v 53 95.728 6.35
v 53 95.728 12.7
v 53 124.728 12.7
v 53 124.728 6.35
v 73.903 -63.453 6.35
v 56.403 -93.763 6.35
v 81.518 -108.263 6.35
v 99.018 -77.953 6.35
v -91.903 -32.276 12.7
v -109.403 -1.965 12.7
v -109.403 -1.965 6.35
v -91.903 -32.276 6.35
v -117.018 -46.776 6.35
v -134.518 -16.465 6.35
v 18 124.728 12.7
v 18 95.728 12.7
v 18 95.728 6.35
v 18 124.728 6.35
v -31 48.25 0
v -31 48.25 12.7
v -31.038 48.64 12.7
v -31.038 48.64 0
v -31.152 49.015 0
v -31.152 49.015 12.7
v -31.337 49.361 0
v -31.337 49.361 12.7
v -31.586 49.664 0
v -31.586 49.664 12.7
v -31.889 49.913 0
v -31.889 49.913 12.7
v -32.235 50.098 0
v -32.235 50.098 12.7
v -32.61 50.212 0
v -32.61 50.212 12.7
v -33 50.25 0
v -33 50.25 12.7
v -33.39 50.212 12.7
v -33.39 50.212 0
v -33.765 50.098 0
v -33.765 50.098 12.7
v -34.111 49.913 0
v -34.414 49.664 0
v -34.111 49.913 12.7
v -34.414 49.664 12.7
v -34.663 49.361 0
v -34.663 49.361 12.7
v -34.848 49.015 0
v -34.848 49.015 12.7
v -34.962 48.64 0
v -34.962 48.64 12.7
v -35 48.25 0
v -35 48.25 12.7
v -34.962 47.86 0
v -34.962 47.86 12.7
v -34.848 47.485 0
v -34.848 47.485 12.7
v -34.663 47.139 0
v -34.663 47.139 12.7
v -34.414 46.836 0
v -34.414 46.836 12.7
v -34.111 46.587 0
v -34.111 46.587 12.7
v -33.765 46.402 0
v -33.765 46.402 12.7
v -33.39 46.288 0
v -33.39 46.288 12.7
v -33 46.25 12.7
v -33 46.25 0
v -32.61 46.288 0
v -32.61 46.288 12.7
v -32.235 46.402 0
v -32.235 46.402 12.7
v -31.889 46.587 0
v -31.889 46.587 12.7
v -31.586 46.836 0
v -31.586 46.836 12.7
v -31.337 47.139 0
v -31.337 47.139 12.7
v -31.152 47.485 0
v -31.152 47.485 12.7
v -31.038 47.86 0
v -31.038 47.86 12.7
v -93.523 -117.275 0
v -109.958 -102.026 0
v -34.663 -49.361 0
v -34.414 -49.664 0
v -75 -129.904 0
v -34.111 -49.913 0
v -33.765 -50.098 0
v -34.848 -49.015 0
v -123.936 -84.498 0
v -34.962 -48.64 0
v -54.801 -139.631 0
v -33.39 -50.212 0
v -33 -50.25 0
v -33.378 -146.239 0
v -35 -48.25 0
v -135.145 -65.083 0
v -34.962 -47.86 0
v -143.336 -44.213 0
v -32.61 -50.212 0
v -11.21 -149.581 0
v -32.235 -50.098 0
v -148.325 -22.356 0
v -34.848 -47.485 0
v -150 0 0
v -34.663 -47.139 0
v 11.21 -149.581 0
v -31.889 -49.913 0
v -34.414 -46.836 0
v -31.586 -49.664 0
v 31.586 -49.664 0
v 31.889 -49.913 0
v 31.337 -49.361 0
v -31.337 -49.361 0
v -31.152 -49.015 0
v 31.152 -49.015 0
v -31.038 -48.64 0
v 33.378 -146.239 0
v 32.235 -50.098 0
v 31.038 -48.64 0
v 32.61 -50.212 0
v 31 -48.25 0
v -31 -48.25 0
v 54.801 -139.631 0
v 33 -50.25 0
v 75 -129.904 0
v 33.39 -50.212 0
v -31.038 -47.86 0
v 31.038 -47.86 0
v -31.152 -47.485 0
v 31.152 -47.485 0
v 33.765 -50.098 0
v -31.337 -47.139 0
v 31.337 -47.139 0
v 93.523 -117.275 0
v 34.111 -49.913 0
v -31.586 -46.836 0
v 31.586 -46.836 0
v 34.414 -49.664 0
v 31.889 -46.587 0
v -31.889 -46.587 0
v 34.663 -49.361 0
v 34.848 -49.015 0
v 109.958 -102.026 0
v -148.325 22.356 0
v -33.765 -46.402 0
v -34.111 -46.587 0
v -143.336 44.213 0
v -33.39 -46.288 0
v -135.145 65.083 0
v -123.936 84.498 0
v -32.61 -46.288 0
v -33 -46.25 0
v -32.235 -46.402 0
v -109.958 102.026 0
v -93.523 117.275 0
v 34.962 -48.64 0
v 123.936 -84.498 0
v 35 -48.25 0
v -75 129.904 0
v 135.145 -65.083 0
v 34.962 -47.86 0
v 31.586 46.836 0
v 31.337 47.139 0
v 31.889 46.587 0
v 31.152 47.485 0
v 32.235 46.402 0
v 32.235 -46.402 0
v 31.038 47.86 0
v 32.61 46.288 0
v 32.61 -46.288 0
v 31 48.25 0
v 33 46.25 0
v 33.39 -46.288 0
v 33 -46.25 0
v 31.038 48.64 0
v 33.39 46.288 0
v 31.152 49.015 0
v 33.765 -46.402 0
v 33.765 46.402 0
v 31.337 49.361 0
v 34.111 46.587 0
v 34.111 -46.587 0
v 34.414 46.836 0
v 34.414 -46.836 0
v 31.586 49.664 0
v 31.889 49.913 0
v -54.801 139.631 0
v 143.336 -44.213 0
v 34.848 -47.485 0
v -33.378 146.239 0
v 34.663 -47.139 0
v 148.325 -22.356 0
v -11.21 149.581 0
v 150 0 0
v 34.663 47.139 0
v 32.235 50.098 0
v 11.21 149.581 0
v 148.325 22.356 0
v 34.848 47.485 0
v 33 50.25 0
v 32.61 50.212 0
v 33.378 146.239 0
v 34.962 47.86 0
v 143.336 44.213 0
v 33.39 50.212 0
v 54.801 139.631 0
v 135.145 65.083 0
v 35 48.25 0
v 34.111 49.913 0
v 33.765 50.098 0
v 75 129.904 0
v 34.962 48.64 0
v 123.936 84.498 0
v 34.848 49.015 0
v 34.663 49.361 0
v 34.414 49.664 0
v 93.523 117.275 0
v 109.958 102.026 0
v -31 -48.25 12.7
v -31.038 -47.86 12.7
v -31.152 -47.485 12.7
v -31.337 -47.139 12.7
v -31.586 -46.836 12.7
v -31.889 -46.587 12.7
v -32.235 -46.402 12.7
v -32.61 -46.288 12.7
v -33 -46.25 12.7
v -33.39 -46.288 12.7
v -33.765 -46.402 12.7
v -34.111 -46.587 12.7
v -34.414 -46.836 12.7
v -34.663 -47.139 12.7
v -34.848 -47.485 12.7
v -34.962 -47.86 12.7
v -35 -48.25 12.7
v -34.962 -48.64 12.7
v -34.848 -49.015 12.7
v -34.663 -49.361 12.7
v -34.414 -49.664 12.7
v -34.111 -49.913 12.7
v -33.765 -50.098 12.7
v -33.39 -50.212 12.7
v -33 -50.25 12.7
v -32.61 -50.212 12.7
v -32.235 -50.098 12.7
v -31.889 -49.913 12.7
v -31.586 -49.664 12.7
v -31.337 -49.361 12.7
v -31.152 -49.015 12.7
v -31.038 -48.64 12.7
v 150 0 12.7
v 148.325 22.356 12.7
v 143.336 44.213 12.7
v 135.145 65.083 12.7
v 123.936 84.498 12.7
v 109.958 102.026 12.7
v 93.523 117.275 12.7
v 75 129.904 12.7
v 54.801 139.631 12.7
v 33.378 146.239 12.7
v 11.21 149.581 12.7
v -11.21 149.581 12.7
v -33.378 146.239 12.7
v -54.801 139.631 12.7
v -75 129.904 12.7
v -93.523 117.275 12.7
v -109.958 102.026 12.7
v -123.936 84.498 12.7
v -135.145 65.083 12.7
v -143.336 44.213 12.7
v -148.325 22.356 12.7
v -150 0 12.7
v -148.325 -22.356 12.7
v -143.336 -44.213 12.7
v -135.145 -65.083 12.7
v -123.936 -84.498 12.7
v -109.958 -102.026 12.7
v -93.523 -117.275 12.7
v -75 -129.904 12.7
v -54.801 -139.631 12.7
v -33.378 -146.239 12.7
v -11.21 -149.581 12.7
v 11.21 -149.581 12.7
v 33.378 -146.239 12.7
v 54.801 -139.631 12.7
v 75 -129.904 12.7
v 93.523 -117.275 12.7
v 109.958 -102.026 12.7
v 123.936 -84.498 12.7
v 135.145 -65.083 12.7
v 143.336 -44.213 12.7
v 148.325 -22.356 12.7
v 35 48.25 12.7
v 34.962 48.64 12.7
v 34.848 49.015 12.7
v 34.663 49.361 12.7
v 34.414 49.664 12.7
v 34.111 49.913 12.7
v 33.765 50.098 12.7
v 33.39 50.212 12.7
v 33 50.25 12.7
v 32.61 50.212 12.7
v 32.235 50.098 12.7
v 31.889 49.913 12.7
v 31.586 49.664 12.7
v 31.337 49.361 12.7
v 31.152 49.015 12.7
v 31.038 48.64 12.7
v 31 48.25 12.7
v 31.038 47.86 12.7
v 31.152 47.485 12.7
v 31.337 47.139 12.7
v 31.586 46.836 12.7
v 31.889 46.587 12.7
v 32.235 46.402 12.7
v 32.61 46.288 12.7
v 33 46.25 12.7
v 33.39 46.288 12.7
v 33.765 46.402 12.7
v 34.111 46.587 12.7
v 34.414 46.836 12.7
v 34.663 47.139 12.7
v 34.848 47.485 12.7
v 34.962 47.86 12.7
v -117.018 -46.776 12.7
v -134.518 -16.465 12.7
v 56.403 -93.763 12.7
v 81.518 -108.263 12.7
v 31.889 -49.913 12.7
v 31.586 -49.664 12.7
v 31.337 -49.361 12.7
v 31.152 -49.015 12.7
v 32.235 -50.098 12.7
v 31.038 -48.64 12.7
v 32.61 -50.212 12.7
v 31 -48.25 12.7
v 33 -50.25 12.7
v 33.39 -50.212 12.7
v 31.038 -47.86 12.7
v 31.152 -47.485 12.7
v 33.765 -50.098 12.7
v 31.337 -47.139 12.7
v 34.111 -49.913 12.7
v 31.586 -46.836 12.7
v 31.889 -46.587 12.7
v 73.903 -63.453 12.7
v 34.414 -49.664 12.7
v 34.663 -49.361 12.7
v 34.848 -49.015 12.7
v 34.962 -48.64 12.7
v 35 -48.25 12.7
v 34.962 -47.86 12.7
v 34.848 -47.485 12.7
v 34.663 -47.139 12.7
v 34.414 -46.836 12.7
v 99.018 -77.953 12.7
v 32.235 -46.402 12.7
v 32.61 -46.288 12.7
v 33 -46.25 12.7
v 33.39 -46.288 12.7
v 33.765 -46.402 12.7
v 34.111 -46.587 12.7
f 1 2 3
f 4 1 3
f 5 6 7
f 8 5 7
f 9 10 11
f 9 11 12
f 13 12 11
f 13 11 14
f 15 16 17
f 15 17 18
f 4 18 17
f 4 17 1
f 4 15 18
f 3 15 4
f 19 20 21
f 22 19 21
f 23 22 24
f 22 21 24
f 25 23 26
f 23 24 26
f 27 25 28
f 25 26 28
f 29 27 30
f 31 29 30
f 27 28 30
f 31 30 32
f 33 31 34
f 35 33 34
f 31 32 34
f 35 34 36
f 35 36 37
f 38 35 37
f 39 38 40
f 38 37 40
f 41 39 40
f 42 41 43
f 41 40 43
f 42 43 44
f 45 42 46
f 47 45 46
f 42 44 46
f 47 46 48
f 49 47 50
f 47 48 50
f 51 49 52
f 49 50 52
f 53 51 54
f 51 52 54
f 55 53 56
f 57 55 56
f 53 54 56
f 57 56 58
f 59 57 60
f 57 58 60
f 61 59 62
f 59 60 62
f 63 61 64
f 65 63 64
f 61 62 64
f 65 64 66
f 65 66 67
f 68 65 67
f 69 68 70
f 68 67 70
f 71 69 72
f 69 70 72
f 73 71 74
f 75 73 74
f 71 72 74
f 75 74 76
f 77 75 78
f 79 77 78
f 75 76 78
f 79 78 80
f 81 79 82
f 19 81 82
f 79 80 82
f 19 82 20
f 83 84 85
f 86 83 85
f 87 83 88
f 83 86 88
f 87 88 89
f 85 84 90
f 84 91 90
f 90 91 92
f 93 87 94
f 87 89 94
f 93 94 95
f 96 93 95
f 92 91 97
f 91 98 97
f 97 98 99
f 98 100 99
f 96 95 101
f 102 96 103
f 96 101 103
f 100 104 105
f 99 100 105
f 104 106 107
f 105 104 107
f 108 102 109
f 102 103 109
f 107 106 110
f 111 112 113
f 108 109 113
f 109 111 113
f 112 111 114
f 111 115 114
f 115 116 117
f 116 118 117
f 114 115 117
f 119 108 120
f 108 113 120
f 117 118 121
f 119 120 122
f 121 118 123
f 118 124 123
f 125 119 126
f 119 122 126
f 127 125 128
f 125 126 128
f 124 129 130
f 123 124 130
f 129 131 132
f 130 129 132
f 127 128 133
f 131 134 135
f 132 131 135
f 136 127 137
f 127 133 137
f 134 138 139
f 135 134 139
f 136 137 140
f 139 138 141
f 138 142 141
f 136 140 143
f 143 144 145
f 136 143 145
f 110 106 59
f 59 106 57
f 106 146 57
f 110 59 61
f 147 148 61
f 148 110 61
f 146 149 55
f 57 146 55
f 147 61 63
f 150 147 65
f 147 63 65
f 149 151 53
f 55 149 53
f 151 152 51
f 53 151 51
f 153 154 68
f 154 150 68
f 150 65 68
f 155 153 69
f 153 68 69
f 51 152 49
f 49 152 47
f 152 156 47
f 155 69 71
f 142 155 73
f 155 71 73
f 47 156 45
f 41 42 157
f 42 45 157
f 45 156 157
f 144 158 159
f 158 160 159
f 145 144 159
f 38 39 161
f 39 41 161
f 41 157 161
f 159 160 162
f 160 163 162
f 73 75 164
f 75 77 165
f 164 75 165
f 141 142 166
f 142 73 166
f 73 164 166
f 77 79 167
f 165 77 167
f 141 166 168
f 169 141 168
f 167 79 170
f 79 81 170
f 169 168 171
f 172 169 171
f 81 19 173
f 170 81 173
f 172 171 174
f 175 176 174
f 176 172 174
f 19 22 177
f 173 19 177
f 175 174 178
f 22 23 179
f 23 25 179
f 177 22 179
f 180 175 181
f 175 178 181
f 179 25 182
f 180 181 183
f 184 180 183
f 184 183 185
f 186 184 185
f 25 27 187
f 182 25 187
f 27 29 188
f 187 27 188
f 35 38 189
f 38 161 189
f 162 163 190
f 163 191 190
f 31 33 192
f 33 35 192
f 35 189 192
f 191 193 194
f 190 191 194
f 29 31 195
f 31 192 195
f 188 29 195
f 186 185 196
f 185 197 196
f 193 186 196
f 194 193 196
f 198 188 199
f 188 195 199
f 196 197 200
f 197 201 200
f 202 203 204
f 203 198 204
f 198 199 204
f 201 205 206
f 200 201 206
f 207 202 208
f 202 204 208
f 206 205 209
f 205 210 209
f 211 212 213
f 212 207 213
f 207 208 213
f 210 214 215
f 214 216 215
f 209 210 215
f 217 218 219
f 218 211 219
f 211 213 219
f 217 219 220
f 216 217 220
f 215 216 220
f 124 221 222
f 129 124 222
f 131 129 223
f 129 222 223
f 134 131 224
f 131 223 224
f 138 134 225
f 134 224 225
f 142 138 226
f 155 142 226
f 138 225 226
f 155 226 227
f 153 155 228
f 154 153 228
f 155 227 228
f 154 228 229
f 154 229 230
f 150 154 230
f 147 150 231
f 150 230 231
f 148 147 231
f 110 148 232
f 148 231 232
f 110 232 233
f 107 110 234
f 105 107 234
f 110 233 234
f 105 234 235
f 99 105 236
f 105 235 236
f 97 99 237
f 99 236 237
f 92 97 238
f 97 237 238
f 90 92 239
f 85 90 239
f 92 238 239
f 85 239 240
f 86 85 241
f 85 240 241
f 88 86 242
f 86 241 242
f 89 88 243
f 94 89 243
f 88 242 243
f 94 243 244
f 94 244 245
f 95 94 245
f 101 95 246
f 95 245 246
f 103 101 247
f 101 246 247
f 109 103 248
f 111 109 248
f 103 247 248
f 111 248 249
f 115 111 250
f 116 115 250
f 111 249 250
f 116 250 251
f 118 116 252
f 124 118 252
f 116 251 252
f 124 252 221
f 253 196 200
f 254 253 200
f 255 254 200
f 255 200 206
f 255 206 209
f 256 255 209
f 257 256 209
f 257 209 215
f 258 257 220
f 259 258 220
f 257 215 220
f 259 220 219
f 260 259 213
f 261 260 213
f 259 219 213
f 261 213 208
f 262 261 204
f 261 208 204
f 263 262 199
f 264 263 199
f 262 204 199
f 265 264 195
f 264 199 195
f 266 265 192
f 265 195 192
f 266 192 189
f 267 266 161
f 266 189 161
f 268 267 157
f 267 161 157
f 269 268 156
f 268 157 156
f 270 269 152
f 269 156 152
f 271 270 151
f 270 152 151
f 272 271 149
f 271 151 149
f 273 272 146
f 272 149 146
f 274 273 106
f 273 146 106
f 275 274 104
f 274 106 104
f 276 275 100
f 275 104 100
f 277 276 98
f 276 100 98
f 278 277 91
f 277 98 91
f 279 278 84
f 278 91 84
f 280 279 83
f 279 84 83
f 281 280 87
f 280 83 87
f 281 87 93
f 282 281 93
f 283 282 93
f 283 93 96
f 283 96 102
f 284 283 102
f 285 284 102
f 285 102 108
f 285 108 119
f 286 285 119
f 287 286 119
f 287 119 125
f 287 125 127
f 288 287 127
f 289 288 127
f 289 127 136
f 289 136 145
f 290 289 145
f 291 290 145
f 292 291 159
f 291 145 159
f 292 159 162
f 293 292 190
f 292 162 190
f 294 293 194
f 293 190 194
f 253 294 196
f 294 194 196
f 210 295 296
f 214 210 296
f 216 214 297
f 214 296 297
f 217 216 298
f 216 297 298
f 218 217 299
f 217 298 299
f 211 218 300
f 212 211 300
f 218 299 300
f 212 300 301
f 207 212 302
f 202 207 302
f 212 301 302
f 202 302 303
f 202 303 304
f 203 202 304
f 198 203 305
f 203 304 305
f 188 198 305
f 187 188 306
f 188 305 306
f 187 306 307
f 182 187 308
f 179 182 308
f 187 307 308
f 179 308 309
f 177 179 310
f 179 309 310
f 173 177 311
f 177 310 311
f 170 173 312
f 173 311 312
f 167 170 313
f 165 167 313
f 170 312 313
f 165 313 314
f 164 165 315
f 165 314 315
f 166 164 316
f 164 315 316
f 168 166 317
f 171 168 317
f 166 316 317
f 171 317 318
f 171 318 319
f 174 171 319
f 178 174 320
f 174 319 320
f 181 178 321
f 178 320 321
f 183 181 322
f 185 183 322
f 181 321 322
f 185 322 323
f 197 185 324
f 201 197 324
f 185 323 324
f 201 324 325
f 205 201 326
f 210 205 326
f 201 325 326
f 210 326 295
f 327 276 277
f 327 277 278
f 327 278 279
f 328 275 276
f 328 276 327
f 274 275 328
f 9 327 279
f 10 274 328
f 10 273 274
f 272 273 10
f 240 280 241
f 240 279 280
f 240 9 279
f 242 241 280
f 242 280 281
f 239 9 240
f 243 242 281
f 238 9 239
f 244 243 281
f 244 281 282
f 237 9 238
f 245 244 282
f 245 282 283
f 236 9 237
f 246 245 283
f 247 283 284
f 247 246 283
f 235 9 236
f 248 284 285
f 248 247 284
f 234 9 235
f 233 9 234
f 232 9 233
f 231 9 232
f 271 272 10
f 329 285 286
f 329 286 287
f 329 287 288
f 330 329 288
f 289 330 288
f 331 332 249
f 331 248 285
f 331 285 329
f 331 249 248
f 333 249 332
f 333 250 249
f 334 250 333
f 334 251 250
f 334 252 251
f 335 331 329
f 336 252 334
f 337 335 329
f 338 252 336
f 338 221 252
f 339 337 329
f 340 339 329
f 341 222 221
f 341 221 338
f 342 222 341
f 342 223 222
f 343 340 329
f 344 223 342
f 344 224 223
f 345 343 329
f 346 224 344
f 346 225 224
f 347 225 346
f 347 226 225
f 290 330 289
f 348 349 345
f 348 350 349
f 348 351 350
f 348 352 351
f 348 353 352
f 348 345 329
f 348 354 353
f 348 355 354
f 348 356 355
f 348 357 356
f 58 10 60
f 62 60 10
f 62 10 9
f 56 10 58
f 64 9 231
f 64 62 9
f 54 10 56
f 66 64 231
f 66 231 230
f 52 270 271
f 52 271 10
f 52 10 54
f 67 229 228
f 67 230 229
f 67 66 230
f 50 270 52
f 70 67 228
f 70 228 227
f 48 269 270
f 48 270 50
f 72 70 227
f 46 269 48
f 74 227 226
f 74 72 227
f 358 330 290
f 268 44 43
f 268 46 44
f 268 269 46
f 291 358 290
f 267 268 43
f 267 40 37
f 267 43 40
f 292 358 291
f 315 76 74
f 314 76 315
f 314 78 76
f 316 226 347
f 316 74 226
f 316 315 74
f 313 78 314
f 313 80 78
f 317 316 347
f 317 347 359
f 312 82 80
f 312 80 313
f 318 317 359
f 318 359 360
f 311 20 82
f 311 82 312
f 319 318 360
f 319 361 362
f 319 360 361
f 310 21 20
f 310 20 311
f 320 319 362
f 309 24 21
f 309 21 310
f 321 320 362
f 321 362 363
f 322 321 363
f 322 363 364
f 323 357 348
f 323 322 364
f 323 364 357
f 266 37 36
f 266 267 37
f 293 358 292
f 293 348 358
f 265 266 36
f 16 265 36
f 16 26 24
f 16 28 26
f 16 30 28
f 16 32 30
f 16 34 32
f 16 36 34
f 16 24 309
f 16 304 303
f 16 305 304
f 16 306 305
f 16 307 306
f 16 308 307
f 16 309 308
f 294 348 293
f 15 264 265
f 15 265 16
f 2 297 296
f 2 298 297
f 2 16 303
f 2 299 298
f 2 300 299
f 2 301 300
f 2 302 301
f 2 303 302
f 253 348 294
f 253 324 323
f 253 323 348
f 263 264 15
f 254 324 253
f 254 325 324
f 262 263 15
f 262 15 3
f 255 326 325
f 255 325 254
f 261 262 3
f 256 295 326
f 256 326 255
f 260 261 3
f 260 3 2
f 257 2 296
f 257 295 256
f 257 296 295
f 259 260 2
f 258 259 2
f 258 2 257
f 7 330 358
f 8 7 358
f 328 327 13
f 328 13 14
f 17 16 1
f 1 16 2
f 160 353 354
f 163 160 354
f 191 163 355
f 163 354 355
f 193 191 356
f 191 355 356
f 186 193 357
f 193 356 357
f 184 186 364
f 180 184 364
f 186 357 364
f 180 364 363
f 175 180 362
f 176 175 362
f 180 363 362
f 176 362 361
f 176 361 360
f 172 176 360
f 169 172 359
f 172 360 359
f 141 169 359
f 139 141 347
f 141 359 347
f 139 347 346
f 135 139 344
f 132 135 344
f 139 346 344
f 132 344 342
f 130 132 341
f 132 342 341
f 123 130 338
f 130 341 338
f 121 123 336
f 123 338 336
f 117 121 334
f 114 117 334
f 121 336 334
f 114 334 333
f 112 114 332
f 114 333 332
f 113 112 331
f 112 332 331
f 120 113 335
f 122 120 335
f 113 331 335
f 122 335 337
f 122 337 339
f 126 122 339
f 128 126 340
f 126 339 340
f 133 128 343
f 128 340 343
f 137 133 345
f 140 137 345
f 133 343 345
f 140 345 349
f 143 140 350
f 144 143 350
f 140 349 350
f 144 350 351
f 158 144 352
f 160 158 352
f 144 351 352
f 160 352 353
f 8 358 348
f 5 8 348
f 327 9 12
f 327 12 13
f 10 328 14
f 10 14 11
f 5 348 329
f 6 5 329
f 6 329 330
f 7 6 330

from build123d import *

# Parameters (mm, degrees)
ESQUISSE1_R             = 150
BOSS_EXTRU_1_DEPTH      = 12.7
ESQUISSE2_R             = 2
ENL_V_MAT_EXTRU_1_DEPTH = 12.7
ESQUISSE6_W             = 35
ESQUISSE6_H             = 29
ENL_V_MAT_EXTRU_2_DEPTH = 6.35


with BuildPart() as part:
    # Esquisse1 → Boss.-Extru.1 (new body)
    with BuildSketch(Plane.XY):
        Circle(ESQUISSE1_R)
    extrude(amount=BOSS_EXTRU_1_DEPTH)

    # Esquisse2 → Enlèv. mat.-Extru.1 (cut)
    with BuildSketch(Plane.XY.offset(12.7)):
        with Locations((-33, 48.25)):
            Circle(ESQUISSE2_R)
        with Locations((33, 48.25)):
            Circle(ESQUISSE2_R)
        with Locations((-33, -48.25)):
            Circle(ESQUISSE2_R)
        with Locations((33, -48.25)):
            Circle(ESQUISSE2_R)
    extrude(amount=-ENL_V_MAT_EXTRU_1_DEPTH, mode=Mode.SUBTRACT)

    # Esquisse6 → Enlèv. mat.-Extru.2 (cut)
    with BuildSketch(Plane.XY.offset(12.7)):
        with Locations((35.5, 110.228215567)):
            Rectangle(ESQUISSE6_W, ESQUISSE6_H)
        Polygon((73.90306654, -63.452565052), (56.40306654, -93.763454184), (81.51780325, -108.263454184), (99.01780325, -77.952565052), align=None)
        Polygon((-109.40306654, -1.964761383), (-91.90306654, -32.275650515), (-117.01780325, -46.775650515), (-134.51780325, -16.464761383), align=None)
    extrude(amount=-ENL_V_MAT_EXTRU_2_DEPTH, mode=Mode.SUBTRACT)


solid = part.part
